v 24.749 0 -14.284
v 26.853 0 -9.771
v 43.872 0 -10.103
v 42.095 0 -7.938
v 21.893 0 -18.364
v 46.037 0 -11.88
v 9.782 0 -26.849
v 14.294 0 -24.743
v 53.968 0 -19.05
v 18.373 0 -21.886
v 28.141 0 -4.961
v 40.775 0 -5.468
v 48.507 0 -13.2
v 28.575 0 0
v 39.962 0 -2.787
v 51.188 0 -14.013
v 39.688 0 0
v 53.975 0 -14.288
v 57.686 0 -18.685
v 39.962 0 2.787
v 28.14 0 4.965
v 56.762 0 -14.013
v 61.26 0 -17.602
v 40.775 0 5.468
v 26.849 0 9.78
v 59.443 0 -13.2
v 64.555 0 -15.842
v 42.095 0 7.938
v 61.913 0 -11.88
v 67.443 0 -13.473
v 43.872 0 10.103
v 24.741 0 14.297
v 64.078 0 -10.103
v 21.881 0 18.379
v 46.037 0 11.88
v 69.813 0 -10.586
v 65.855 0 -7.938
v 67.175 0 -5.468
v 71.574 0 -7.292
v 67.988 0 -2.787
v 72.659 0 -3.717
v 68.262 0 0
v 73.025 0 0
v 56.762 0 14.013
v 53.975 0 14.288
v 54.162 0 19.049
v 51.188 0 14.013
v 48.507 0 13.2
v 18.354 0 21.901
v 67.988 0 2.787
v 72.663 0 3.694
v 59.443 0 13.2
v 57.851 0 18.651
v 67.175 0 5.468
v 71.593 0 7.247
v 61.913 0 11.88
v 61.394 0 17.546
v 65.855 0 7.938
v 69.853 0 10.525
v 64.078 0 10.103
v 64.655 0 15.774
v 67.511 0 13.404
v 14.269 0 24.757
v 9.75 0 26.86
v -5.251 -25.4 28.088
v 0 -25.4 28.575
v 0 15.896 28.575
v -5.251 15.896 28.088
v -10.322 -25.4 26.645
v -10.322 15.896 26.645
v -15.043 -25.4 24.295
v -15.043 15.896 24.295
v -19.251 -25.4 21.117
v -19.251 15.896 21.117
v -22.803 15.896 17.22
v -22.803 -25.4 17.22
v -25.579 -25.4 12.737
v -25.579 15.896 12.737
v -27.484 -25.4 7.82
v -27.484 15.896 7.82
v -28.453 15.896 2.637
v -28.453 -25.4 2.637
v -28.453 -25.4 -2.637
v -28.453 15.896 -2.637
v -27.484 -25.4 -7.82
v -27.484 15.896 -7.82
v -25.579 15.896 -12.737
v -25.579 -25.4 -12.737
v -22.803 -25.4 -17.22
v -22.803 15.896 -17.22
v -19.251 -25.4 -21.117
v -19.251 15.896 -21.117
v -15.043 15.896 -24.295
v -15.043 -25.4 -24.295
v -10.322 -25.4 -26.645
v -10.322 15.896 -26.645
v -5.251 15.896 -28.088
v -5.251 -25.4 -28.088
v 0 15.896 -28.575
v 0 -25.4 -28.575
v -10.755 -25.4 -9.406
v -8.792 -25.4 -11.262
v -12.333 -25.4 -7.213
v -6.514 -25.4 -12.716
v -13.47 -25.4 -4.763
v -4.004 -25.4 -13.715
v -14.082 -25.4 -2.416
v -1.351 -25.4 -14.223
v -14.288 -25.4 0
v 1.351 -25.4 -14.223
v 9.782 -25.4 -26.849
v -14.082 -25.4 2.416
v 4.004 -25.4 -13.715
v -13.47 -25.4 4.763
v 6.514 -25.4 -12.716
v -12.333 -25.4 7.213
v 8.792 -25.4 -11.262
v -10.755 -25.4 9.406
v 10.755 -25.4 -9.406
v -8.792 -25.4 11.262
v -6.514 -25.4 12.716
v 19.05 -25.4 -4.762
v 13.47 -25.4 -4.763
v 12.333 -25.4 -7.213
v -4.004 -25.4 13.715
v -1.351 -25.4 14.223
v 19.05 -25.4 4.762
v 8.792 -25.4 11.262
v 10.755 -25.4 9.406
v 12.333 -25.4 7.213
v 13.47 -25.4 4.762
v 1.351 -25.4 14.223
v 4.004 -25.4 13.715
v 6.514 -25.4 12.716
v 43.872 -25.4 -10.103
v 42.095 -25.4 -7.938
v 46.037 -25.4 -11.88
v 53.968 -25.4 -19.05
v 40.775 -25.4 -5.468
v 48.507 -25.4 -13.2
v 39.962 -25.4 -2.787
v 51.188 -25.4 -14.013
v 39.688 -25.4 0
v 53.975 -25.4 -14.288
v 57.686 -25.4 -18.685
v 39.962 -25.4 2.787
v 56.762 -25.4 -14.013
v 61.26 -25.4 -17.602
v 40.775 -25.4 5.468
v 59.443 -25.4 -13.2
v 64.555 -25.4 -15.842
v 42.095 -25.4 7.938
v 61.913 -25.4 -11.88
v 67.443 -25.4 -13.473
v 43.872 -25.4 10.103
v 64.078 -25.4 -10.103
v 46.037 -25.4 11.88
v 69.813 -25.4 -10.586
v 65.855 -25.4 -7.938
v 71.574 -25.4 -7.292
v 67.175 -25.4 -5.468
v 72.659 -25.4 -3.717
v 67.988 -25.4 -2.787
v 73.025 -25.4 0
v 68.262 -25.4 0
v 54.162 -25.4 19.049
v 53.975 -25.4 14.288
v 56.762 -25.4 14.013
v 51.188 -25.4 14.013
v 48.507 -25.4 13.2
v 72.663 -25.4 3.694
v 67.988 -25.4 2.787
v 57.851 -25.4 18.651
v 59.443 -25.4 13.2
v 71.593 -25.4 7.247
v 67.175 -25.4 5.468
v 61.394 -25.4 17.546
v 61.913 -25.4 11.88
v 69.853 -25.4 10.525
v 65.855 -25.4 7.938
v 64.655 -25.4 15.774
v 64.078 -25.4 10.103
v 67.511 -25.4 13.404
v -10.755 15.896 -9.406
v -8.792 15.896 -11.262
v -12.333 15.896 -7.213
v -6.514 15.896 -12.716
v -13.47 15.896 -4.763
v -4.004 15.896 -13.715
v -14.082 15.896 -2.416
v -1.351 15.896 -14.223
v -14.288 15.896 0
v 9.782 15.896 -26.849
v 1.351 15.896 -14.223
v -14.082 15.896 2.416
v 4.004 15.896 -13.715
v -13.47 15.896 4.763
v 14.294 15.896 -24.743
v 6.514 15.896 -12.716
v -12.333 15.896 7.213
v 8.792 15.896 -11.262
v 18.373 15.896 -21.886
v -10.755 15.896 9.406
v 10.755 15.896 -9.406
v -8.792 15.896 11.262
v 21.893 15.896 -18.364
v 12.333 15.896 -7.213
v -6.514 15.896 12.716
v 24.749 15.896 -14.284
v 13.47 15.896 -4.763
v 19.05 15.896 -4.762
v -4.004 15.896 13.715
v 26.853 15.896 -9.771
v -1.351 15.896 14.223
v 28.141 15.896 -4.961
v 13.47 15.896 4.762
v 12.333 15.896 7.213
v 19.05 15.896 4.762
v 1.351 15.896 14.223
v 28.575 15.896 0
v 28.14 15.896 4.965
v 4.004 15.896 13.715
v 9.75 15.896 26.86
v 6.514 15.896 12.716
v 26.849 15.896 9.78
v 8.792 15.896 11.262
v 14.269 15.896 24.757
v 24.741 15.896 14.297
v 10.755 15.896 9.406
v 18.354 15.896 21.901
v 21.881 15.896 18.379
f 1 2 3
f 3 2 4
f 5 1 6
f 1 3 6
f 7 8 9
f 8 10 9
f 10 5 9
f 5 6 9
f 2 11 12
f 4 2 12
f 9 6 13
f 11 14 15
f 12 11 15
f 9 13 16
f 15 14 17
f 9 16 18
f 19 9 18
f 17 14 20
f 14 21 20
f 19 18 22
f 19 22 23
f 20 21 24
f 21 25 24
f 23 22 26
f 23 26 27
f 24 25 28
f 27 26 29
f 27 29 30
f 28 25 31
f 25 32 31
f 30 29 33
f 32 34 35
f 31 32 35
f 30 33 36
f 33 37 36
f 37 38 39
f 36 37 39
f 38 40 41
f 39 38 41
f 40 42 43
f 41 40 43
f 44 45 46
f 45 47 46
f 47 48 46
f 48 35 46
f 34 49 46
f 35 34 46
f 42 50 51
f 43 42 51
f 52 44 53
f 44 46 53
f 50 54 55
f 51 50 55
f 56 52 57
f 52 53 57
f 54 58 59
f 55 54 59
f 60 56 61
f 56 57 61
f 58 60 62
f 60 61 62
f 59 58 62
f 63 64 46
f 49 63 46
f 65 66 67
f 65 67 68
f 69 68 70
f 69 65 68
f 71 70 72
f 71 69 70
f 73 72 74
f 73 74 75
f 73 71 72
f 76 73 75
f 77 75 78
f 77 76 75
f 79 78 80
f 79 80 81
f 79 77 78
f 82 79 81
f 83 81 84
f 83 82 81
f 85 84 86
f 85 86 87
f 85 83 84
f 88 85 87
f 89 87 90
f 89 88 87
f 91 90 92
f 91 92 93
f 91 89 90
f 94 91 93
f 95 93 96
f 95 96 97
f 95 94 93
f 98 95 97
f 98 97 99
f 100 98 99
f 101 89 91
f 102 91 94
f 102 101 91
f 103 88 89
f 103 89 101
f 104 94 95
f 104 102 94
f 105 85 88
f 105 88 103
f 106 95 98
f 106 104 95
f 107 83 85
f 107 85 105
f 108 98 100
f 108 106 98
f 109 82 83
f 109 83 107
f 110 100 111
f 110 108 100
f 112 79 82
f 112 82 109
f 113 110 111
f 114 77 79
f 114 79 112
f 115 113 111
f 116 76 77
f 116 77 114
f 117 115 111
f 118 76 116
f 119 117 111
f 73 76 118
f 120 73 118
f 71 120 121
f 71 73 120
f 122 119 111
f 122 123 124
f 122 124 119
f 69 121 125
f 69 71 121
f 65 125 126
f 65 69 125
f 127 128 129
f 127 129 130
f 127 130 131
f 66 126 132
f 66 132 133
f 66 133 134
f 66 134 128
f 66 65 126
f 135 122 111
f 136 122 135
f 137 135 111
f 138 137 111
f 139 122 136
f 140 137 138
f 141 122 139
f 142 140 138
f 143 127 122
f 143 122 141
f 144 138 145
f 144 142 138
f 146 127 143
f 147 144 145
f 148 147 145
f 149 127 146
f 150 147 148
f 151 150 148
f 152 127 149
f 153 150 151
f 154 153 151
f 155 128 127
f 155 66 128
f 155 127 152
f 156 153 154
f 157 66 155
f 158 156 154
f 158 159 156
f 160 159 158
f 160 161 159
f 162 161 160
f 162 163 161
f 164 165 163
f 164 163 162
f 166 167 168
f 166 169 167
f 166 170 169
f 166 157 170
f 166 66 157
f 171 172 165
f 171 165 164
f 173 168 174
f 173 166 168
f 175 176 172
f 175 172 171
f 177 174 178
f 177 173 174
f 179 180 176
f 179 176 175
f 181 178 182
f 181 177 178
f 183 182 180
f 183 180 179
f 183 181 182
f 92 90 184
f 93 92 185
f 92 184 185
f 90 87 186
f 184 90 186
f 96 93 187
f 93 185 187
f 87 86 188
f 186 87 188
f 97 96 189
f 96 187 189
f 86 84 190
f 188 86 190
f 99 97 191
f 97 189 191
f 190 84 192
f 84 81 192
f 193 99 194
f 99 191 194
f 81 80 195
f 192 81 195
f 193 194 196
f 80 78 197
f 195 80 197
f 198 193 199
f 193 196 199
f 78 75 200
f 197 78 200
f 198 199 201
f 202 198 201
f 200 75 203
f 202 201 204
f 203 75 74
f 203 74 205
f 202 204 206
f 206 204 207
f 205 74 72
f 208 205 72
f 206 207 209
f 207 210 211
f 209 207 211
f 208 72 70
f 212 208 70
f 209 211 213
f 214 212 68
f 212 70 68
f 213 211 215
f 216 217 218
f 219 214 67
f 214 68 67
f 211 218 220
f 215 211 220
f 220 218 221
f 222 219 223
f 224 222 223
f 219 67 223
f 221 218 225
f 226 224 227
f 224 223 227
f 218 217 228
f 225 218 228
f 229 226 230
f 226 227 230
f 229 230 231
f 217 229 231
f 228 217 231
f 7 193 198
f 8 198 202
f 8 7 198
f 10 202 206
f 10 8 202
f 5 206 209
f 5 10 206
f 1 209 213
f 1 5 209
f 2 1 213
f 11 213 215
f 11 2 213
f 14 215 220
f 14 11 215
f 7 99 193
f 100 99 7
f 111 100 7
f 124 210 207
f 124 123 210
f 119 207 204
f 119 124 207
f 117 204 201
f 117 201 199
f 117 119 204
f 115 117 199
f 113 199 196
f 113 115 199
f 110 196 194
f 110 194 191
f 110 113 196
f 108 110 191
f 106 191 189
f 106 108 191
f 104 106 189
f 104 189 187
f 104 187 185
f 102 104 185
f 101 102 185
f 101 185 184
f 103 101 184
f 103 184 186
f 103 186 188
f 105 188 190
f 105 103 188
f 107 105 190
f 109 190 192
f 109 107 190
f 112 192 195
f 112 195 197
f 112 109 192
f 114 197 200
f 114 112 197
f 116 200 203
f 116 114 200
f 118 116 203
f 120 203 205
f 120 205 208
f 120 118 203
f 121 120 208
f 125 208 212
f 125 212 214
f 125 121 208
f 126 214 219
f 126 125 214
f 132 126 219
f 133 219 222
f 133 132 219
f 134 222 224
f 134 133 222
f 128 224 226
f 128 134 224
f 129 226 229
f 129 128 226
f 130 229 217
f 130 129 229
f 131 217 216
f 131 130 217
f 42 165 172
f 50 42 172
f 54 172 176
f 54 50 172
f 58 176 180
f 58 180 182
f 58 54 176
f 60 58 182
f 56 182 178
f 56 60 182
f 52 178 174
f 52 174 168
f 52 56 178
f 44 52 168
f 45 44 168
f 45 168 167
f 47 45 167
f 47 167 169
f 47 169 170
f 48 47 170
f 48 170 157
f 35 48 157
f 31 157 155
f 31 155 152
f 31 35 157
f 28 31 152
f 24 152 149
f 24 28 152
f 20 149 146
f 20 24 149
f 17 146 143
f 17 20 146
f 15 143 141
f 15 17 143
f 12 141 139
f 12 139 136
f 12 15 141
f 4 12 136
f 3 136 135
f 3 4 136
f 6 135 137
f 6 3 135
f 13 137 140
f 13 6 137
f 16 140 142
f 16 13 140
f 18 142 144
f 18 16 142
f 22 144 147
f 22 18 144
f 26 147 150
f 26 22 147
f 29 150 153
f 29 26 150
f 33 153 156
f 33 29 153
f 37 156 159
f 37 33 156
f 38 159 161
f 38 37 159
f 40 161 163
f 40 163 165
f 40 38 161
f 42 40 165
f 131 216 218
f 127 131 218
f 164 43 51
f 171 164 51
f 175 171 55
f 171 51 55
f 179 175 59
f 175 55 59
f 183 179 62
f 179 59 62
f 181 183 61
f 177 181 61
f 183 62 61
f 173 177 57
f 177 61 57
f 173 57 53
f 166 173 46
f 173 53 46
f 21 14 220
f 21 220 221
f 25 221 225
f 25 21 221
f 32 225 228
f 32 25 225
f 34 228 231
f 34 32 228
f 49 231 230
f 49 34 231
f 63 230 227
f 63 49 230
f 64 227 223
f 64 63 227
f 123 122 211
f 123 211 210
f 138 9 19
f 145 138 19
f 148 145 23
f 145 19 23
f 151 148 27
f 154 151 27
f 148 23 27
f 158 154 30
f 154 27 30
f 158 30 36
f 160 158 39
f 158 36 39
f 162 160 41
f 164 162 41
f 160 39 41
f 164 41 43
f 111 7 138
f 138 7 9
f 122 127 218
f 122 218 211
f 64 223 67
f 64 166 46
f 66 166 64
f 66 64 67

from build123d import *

# Parameters (mm, degrees)
F0_R     = 14.2875
F1_DEPTH = 25.4
F2_DEPTH = 15.89601


with BuildPart() as f1:
    # F0 (on Front) → F1 (new body)
    with BuildSketch(Plane.XZ):
        with BuildLine():
            Line((9.7499238233, 26.8601863441), (0, 28.575))
            ThreePointArc((0, 28.575), (-28.575, 0), (0, -28.575))
            Line((0, -28.575), (9.7818449028, -26.8485779008))
            ThreePointArc((9.7818449028, -26.8485779008), (23.4099000756, -16.3861894122), (28.575, 0))
            ThreePointArc((28.575, 0), (23.4001570321, 16.4000998739), (9.7499238233, 26.8601863441))
        make_face()
        with BuildLine():
            ThreePointArc((-13.4703841816, 4.7625), (0, 14.2875), (13.4703841816, 4.7625))
            Line((13.4703841816, 4.7625), (19.05, 4.7625))
            Line((19.05, 4.7625), (19.05, -4.7625))
            Line((19.05, -4.7625), (13.4703841816, -4.7625))
            ThreePointArc((13.4703841816, -4.7625), (0, -14.2875), (-13.4703841816, -4.7625))
            Line((-13.4703841816, -4.7625), (-19.05, -4.7625))
            Line((-19.05, -4.7625), (-19.05, 4.7625))
            Line((-19.05, 4.7625), (-13.4703841816, 4.7625))
        make_face(mode=Mode.SUBTRACT)
        with BuildLine():
            Line((54.1615282252, 19.0490867818), (9.7499238233, 26.8601863441))
            ThreePointArc((9.7499238233, 26.8601863441), (23.4001570321, 16.4000998739), (28.575, 0))
            ThreePointArc((28.575, 0), (23.4099000756, -16.3861894122), (9.7818449028, -26.8485779008))
            Line((9.7818449028, -26.8485779008), (53.9683106658, -19.0499988255))
            ThreePointArc((53.9683106658, -19.0499988255), (34.9252449744, 0.096609856), (54.1615282252, 19.0490867818))
        make_face()
        with BuildLine():
            ThreePointArc((73.025, 0), (67.5111712218, 13.4042742681), (54.1615282252, 19.0490867818))
            ThreePointArc((54.1615282252, 19.0490867818), (34.9252449744, 0.096609856), (53.9683106658, -19.0499988255))
            ThreePointArc((53.9683106658, -19.0499988255), (67.4430189372, -13.4727490108), (73.025, 0))
        make_face()
        with Locations((53.975, 0)):
            Circle(F0_R, mode=Mode.SUBTRACT)
        with BuildLine():
            ThreePointArc((-13.4703841816, -4.7625), (-14.2875, 0), (-13.4703841816, 4.7625))
            Line((-13.4703841816, 4.7625), (-19.05, 4.7625))
            Line((-19.05, 4.7625), (-19.05, -4.7625))
            Line((-19.05, -4.7625), (-13.4703841816, -4.7625))
        make_face()
    extrude(amount=F1_DEPTH)

    # F0 (on Front) → F2 (join)
    with BuildSketch(Plane.XZ):
        with BuildLine():
            Line((9.7499238233, 26.8601863441), (0, 28.575))
            ThreePointArc((0, 28.575), (-28.575, 0), (0, -28.575))
            Line((0, -28.575), (9.7818449028, -26.8485779008))
            ThreePointArc((9.7818449028, -26.8485779008), (23.4099000756, -16.3861894122), (28.575, 0))
            ThreePointArc((28.575, 0), (23.4001570321, 16.4000998739), (9.7499238233, 26.8601863441))
        make_face()
        with BuildLine():
            ThreePointArc((-13.4703841816, 4.7625), (0, 14.2875), (13.4703841816, 4.7625))
            Line((13.4703841816, 4.7625), (19.05, 4.7625))
            Line((19.05, 4.7625), (19.05, -4.7625))
            Line((19.05, -4.7625), (13.4703841816, -4.7625))
            ThreePointArc((13.4703841816, -4.7625), (0, -14.2875), (-13.4703841816, -4.7625))
            Line((-13.4703841816, -4.7625), (-19.05, -4.7625))
            Line((-19.05, -4.7625), (-19.05, 4.7625))
            Line((-19.05, 4.7625), (-13.4703841816, 4.7625))
        make_face(mode=Mode.SUBTRACT)
        with BuildLine():
            ThreePointArc((-13.4703841816, -4.7625), (-14.2875, 0), (-13.4703841816, 4.7625))
            Line((-13.4703841816, 4.7625), (-19.05, 4.7625))
            Line((-19.05, 4.7625), (-19.05, -4.7625))
            Line((-19.05, -4.7625), (-13.4703841816, -4.7625))
        make_face()
    extrude(amount=-F2_DEPTH)


solid = f1.part
